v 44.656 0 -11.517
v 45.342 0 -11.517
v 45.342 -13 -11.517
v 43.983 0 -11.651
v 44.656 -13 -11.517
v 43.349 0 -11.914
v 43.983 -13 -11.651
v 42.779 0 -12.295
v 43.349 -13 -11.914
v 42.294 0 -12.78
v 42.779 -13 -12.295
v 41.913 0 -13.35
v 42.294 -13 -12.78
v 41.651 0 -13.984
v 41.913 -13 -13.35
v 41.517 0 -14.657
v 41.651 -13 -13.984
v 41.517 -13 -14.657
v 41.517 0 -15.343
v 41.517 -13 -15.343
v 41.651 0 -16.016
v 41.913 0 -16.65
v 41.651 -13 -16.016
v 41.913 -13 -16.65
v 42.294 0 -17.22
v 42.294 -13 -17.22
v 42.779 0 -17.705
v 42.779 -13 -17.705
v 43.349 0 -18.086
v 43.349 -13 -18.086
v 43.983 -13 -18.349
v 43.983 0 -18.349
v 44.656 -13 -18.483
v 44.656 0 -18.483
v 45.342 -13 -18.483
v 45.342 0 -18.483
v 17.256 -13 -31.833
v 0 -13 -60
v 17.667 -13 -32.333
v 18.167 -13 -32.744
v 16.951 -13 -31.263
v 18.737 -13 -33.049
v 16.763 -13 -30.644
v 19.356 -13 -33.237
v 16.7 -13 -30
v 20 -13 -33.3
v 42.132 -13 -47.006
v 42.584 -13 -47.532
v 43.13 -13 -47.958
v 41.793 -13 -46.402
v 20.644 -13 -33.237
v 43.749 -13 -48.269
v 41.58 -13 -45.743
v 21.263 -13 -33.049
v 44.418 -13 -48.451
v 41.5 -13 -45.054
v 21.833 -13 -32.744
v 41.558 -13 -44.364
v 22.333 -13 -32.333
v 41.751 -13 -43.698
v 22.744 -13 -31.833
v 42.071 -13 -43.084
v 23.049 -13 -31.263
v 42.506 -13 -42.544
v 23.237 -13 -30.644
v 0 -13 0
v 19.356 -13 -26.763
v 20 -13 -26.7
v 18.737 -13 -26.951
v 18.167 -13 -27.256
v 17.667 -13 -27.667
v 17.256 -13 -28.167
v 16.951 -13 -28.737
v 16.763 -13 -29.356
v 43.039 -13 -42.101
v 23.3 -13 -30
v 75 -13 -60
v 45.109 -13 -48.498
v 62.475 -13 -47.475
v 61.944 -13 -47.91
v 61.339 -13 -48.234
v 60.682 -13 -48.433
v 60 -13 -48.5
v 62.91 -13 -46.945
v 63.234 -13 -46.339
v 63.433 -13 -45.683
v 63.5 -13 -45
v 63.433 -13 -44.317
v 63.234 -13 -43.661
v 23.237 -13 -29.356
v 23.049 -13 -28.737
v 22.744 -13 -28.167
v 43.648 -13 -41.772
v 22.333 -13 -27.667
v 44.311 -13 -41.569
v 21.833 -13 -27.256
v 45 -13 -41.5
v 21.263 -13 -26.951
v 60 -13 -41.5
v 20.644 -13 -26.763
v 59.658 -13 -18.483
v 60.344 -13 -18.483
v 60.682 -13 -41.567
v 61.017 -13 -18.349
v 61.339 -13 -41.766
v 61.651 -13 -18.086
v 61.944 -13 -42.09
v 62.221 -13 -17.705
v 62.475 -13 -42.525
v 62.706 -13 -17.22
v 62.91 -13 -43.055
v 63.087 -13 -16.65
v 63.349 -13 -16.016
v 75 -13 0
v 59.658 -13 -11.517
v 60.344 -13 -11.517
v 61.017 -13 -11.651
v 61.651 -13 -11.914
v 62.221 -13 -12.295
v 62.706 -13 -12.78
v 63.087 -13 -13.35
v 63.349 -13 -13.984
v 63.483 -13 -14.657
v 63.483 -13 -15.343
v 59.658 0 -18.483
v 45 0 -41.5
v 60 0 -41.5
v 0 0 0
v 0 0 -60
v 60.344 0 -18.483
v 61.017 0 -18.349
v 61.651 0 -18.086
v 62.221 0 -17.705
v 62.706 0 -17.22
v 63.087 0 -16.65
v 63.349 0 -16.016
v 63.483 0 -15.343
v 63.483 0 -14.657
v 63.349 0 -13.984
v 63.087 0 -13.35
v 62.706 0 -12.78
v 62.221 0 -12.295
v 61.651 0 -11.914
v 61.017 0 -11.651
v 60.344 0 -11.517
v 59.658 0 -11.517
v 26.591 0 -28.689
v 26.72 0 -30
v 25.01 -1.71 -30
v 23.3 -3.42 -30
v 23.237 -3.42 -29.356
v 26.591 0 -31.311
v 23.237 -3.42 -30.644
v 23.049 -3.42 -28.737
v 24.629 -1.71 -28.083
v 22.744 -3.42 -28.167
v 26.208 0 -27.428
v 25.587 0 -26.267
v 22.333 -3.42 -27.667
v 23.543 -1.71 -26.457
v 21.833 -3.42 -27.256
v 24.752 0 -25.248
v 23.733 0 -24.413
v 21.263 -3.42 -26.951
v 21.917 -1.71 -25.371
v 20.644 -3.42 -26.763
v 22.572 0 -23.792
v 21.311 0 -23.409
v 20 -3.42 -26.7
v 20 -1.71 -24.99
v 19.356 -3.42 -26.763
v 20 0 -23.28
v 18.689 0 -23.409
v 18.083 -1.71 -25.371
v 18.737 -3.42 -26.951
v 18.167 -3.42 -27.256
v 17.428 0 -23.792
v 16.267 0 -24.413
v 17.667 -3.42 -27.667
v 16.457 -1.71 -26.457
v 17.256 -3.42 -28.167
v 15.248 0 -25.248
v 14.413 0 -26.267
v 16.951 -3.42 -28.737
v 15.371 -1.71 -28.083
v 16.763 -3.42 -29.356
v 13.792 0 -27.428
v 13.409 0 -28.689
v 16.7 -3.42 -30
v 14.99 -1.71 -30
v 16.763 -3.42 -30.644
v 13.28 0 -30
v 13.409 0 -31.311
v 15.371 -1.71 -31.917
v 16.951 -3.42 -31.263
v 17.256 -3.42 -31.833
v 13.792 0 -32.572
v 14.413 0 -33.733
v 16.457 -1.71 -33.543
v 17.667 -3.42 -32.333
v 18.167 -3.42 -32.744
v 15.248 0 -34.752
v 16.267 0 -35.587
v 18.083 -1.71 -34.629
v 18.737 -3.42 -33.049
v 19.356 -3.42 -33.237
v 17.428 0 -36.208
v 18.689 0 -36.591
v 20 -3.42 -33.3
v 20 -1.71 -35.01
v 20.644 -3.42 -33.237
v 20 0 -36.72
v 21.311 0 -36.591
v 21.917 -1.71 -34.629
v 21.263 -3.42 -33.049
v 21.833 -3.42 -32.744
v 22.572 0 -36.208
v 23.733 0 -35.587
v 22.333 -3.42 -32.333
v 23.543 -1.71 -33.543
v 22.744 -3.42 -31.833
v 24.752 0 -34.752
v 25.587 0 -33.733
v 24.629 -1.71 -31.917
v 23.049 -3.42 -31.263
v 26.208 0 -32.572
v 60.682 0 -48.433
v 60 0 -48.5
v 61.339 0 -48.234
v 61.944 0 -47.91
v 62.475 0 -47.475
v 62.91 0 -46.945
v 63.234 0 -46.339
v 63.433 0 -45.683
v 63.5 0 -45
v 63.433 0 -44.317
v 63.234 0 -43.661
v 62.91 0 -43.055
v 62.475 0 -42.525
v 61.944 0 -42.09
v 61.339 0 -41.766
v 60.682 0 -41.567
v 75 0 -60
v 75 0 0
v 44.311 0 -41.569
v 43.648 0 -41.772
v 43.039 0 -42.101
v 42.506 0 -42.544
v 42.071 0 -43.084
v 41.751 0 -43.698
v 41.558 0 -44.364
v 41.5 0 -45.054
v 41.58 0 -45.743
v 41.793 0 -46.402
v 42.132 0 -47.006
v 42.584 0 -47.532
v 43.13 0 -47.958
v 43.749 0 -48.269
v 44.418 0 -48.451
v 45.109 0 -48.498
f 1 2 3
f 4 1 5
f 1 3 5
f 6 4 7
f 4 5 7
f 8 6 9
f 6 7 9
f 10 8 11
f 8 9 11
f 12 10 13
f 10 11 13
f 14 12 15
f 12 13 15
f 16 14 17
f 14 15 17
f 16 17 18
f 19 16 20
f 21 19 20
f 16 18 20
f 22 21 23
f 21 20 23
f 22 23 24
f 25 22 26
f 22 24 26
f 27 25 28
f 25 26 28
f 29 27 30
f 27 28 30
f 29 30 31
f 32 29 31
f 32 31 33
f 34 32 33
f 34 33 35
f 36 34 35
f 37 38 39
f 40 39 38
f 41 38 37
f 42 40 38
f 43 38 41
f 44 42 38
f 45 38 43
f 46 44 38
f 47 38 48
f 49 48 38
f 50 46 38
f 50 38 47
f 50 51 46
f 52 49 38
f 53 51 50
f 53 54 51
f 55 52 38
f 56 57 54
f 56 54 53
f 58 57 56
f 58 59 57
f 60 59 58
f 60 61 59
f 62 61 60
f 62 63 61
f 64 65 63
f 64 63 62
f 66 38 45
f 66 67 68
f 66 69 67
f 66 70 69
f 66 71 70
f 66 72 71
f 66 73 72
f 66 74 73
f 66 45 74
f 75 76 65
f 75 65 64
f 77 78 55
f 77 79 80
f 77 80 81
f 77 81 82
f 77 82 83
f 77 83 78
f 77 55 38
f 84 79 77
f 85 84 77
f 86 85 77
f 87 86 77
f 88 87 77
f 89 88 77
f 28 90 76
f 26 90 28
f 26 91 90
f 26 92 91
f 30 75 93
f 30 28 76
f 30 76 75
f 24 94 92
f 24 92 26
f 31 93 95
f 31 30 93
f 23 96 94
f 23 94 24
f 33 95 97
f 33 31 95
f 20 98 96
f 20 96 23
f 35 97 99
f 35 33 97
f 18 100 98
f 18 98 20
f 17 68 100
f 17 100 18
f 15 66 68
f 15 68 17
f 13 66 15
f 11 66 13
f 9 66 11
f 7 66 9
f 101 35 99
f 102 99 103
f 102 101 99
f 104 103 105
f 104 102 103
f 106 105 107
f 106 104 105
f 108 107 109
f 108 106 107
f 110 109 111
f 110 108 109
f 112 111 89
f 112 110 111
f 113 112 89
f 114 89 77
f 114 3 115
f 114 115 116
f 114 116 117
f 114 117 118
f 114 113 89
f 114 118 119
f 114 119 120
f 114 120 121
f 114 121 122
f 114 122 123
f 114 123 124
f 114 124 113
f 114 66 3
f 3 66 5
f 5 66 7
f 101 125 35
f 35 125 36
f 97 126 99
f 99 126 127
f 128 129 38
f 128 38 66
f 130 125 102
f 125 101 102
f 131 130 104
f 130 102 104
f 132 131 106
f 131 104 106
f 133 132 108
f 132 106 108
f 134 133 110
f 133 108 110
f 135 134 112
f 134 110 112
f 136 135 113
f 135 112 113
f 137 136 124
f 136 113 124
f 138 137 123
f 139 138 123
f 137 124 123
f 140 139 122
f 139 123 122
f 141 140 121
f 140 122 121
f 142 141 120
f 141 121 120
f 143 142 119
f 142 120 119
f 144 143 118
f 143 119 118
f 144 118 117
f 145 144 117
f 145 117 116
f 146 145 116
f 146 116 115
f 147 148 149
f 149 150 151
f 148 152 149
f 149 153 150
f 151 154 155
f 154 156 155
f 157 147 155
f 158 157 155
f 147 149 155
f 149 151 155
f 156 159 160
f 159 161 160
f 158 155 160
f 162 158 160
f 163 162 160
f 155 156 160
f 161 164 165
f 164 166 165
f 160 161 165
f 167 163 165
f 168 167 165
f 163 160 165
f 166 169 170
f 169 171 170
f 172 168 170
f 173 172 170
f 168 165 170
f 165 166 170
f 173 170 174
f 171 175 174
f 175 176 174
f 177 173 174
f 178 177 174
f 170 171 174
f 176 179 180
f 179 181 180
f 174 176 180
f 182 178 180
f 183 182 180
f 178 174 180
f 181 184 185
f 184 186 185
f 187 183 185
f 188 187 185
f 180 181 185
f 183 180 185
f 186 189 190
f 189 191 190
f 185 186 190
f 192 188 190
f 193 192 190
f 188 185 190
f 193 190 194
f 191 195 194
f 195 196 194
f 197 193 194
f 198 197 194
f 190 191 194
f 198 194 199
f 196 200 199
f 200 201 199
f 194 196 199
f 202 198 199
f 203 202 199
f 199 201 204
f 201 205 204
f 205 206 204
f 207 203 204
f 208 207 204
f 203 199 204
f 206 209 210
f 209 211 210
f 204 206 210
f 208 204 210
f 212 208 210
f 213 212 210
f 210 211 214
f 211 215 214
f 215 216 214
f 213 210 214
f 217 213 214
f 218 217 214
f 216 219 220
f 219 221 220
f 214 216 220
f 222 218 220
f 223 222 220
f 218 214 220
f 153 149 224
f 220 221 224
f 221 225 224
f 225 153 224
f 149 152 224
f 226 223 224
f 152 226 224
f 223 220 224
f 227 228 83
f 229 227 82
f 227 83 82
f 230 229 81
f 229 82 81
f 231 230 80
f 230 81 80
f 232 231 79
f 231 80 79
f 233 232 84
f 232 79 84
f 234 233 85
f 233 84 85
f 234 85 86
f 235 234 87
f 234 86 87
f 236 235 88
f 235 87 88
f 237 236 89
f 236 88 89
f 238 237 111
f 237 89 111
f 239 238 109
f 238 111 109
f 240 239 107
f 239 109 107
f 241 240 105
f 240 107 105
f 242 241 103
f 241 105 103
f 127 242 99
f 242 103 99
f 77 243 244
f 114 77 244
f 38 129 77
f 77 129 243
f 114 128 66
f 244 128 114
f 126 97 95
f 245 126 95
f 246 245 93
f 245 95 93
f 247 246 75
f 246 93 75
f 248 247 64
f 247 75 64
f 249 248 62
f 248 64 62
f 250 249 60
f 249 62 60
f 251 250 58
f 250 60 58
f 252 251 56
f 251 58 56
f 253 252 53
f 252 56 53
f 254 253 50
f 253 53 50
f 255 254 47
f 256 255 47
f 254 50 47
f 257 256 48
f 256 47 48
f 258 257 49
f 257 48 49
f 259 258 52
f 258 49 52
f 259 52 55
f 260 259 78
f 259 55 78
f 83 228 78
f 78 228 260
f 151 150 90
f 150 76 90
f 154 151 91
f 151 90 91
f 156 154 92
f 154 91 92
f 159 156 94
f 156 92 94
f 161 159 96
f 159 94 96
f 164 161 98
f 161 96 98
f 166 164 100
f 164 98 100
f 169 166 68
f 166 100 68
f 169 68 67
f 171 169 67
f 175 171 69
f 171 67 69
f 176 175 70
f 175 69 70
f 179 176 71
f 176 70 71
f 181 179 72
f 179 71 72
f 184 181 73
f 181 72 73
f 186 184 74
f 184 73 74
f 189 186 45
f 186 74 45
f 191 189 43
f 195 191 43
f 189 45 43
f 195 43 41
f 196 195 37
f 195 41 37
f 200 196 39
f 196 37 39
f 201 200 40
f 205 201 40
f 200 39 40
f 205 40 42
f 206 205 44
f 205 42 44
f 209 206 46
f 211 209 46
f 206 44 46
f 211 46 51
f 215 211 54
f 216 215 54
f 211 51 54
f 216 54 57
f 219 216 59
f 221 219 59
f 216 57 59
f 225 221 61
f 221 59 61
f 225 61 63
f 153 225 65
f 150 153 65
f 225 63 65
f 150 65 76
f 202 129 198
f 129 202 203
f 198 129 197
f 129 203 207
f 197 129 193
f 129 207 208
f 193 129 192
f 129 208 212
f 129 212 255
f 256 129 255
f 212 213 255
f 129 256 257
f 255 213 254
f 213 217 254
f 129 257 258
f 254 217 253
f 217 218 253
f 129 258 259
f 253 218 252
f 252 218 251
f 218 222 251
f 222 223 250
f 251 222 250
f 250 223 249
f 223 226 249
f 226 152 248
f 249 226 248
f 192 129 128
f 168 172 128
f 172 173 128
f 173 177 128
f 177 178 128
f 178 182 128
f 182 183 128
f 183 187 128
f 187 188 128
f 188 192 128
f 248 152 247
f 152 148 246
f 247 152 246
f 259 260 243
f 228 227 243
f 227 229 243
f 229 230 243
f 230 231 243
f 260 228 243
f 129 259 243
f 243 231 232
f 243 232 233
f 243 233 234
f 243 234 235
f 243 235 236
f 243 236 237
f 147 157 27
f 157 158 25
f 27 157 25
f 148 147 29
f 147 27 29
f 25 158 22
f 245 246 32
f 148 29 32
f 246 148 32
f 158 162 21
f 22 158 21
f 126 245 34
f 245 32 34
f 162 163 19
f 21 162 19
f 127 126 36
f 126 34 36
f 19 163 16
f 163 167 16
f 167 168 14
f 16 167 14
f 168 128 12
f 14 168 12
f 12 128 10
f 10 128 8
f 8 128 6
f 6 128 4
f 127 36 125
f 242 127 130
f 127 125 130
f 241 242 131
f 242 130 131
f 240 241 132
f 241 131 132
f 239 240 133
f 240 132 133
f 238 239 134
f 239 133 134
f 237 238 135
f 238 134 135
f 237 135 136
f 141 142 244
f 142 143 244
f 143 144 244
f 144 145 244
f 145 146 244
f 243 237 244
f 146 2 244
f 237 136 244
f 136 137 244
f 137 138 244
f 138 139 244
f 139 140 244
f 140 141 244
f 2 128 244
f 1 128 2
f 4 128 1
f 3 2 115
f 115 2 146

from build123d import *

# Parameters (mm, degrees)
F0_W           = 75
F0_H           = 60
F1_DEPTH       = 13
F3_D           = 6.6
F3_CSINK_D     = 13.44
F3_CSINK_ANGLE = 90
F5_D           = 7
F7_DEPTH       = 25
F9_DEPTH       = 25


with BuildPart() as f1:
    # F0 (on Front) → F1 (new body)
    with BuildSketch(Plane.XZ):
        with Locations((37.5, -30)):
            Rectangle(F0_W, F0_H)
    extrude(amount=F1_DEPTH)

    # F3 (through all)
    with Locations(Plane(origin=(0, 0, 0), x_dir=(-1, 0, 0), z_dir=(0, 1, 0))):
        with Locations((-20, -30)):
            CounterSinkHole(F3_D / 2, F3_CSINK_D / 2, counter_sink_angle=F3_CSINK_ANGLE)

    # F5 (through all)
    with Locations(Plane(origin=(0, 0, 0), x_dir=(-1, 0, 0), z_dir=(0, 1, 0))):
        with Locations((-45, -45), (-60, -45), (-60, -15), (-45, -15)):
            Hole(F5_D / 2)

    # F6 (on face) → F7 (cut)
    with BuildSketch(Plane(origin=(0, 0, 0), x_dir=(-1, 0, 0), z_dir=(0, 1, 0))):
        Polygon((-59.9996023931, -48.4999999774), (-45.1088056195, -48.4983083536), (-45.0000000053, -41.5), (-59.9996023931, -41.5000000226), align=None)
    extrude(amount=-F7_DEPTH, mode=Mode.SUBTRACT)

    # F8 (on face) → F9 (cut)
    with BuildSketch(Plane(origin=(0, 0, 0), x_dir=(-1, 0, 0), z_dir=(0, 1, 0))):
        with BuildLine():
            Line((-45.3417231841, -11.5167220517), (-59.6582768159, -11.5167220517))
            ThreePointArc((-59.6582768159, -11.5167220517), (-57.4071221448, -12.64904606), (-56.5, -15))
            ThreePointArc((-56.5, -15), (-57.4071221448, -17.35095394), (-59.6582768159, -18.4832779483))
            Line((-59.6582768159, -18.4832779483), (-45.3417231841, -18.4832779483))
            ThreePointArc((-45.3417231841, -18.4832779483), (-48.5, -15), (-45.3417231841, -11.5167220517))
        make_face()
    extrude(amount=-F9_DEPTH, mode=Mode.SUBTRACT)


solid = f1.part
